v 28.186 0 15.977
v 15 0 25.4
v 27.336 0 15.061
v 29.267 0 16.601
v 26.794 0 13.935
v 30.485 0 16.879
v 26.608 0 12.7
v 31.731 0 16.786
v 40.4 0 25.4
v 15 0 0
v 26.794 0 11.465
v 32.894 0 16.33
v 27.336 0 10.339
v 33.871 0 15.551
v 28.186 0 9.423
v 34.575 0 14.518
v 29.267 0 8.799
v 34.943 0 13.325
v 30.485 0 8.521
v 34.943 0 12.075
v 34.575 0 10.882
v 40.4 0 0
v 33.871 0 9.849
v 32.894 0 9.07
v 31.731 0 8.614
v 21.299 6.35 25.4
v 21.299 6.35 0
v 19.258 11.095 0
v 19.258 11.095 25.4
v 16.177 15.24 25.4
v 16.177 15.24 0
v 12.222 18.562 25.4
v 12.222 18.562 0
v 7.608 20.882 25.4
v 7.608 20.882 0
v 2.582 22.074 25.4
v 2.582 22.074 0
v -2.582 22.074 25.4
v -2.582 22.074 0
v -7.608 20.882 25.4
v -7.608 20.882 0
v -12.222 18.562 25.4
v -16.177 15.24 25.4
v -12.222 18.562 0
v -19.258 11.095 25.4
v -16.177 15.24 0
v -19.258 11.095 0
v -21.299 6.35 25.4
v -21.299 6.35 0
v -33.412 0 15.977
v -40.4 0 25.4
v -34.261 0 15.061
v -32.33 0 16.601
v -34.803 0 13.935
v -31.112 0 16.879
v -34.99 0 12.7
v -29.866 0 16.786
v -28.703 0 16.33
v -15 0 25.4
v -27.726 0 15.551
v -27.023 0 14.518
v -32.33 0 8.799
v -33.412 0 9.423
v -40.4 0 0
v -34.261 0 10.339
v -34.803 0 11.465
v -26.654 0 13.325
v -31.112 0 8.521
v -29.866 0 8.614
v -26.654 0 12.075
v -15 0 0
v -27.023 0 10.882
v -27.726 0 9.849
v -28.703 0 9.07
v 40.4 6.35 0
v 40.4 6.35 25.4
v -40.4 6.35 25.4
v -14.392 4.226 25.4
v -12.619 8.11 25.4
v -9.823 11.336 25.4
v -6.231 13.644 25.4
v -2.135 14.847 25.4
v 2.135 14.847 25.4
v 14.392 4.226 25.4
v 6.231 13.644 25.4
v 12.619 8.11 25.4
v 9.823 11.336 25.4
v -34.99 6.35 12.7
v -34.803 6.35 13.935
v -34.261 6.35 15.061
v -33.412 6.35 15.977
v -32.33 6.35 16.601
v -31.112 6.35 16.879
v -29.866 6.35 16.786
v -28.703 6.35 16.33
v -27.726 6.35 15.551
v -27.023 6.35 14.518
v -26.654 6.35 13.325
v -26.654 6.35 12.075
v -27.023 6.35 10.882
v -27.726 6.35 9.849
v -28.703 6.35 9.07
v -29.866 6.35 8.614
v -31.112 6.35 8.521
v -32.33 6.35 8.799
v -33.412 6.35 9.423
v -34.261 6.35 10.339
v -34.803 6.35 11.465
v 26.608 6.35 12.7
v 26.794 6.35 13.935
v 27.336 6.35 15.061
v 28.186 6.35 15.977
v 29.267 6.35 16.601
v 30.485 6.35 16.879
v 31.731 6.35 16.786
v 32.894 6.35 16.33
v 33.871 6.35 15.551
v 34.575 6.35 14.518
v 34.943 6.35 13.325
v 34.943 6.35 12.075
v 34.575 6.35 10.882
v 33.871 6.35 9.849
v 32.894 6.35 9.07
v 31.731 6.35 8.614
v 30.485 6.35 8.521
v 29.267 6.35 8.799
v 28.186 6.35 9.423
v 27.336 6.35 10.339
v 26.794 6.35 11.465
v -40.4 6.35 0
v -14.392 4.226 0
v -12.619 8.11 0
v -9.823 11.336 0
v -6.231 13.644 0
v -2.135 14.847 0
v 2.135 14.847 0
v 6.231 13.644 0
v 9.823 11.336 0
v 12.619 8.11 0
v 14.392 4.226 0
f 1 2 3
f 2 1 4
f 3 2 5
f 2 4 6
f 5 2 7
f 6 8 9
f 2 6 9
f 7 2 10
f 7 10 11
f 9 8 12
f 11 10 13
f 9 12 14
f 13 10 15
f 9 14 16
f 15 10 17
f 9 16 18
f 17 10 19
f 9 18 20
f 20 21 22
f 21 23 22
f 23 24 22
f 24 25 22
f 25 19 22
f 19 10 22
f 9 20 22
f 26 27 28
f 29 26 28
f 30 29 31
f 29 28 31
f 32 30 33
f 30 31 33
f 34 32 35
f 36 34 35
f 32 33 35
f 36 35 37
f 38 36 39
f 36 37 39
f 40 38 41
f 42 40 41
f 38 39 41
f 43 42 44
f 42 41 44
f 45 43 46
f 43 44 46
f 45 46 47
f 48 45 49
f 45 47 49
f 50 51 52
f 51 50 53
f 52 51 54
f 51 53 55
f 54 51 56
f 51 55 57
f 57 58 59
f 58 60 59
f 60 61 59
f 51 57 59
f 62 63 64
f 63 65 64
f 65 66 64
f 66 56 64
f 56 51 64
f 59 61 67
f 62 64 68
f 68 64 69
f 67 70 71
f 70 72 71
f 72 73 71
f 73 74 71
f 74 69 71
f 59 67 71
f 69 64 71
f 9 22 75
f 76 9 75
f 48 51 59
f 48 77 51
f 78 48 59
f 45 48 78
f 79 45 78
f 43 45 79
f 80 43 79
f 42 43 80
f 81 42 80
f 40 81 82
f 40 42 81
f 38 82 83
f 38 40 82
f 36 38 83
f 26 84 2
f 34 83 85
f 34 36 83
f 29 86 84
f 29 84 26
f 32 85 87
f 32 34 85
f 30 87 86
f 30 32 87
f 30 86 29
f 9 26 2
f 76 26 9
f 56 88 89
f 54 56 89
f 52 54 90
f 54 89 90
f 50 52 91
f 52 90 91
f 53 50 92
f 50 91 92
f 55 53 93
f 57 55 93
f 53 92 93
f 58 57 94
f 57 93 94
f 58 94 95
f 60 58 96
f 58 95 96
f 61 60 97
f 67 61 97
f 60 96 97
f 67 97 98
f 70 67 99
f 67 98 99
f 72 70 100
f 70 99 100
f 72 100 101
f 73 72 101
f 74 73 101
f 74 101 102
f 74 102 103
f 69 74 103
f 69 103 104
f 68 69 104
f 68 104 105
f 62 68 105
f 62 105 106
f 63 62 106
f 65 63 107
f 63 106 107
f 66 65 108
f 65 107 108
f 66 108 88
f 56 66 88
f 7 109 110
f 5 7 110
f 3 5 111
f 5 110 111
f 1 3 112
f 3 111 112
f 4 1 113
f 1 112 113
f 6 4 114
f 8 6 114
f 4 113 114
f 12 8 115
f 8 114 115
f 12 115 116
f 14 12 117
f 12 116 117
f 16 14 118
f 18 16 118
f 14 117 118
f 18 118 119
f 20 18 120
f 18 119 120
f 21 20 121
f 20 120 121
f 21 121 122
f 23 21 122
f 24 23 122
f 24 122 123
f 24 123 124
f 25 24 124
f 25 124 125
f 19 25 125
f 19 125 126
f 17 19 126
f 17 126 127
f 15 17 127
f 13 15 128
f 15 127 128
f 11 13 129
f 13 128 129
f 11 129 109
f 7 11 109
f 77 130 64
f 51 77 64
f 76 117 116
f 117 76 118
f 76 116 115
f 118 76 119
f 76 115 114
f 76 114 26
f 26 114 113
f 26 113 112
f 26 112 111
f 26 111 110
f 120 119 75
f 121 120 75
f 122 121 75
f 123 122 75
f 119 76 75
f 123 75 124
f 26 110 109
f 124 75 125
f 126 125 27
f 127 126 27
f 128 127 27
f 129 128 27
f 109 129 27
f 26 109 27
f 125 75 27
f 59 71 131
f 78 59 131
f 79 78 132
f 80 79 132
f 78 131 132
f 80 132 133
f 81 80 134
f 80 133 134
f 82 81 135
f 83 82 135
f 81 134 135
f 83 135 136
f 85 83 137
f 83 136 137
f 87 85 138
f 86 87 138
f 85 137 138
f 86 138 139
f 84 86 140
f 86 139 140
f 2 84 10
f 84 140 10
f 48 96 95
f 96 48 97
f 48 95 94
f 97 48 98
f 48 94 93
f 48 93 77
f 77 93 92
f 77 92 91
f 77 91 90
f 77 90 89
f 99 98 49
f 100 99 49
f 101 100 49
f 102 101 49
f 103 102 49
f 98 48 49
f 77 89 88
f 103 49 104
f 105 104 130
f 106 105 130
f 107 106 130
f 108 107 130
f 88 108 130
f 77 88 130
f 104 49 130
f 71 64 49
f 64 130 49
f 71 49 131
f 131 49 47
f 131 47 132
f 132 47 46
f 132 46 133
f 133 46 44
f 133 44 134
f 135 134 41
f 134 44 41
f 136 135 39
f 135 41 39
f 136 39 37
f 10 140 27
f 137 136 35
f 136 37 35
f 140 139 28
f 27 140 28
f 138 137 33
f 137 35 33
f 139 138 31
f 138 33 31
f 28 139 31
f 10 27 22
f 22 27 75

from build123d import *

# Parameters (mm, degrees)
BOSS_EXTRUDE1_DEPTH = 25.4
SKETCH2_R           = 4.191
CUT_EXTRUDE1_DEPTH  = 6.35


with BuildPart() as part:
    # Sketch1 → Boss-Extrude1 (new body)
    with BuildSketch(Plane.XY):
        with BuildLine():
            Line((-40.4, 0), (-15, 0))
            ThreePointArc((-15, 0), (0, 15), (15, 0))
            Line((15, 0), (40.4, 0))
            Line((40.4, 0), (40.4, 6.35))
            Line((40.4, 6.35), (21.298547486, 6.35))
            ThreePointArc((21.298547486, 6.35), (0, 22.225), (-21.298547486, 6.35))
            Line((-21.298547486, 6.35), (-40.4, 6.35))
            Line((-40.4, 6.35), (-40.4, 0))
        make_face()
    extrude(amount=BOSS_EXTRUDE1_DEPTH)

    # Sketch2 → Cut-Extrude1 (cut)
    with BuildSketch(Plane(origin=(0, 6.35, 0), x_dir=(1, 0, 0), z_dir=(0, 1, 0))):
        with Locations(Location((-30.798547486, -12.7, 0), (0, 0, 180))):
            Circle(SKETCH2_R)
        with Locations(Location((30.798553886, -12.7, 0), (0, 0, 180))):
            Circle(SKETCH2_R)
    extrude(amount=-CUT_EXTRUDE1_DEPTH, mode=Mode.SUBTRACT)


solid = part.part
